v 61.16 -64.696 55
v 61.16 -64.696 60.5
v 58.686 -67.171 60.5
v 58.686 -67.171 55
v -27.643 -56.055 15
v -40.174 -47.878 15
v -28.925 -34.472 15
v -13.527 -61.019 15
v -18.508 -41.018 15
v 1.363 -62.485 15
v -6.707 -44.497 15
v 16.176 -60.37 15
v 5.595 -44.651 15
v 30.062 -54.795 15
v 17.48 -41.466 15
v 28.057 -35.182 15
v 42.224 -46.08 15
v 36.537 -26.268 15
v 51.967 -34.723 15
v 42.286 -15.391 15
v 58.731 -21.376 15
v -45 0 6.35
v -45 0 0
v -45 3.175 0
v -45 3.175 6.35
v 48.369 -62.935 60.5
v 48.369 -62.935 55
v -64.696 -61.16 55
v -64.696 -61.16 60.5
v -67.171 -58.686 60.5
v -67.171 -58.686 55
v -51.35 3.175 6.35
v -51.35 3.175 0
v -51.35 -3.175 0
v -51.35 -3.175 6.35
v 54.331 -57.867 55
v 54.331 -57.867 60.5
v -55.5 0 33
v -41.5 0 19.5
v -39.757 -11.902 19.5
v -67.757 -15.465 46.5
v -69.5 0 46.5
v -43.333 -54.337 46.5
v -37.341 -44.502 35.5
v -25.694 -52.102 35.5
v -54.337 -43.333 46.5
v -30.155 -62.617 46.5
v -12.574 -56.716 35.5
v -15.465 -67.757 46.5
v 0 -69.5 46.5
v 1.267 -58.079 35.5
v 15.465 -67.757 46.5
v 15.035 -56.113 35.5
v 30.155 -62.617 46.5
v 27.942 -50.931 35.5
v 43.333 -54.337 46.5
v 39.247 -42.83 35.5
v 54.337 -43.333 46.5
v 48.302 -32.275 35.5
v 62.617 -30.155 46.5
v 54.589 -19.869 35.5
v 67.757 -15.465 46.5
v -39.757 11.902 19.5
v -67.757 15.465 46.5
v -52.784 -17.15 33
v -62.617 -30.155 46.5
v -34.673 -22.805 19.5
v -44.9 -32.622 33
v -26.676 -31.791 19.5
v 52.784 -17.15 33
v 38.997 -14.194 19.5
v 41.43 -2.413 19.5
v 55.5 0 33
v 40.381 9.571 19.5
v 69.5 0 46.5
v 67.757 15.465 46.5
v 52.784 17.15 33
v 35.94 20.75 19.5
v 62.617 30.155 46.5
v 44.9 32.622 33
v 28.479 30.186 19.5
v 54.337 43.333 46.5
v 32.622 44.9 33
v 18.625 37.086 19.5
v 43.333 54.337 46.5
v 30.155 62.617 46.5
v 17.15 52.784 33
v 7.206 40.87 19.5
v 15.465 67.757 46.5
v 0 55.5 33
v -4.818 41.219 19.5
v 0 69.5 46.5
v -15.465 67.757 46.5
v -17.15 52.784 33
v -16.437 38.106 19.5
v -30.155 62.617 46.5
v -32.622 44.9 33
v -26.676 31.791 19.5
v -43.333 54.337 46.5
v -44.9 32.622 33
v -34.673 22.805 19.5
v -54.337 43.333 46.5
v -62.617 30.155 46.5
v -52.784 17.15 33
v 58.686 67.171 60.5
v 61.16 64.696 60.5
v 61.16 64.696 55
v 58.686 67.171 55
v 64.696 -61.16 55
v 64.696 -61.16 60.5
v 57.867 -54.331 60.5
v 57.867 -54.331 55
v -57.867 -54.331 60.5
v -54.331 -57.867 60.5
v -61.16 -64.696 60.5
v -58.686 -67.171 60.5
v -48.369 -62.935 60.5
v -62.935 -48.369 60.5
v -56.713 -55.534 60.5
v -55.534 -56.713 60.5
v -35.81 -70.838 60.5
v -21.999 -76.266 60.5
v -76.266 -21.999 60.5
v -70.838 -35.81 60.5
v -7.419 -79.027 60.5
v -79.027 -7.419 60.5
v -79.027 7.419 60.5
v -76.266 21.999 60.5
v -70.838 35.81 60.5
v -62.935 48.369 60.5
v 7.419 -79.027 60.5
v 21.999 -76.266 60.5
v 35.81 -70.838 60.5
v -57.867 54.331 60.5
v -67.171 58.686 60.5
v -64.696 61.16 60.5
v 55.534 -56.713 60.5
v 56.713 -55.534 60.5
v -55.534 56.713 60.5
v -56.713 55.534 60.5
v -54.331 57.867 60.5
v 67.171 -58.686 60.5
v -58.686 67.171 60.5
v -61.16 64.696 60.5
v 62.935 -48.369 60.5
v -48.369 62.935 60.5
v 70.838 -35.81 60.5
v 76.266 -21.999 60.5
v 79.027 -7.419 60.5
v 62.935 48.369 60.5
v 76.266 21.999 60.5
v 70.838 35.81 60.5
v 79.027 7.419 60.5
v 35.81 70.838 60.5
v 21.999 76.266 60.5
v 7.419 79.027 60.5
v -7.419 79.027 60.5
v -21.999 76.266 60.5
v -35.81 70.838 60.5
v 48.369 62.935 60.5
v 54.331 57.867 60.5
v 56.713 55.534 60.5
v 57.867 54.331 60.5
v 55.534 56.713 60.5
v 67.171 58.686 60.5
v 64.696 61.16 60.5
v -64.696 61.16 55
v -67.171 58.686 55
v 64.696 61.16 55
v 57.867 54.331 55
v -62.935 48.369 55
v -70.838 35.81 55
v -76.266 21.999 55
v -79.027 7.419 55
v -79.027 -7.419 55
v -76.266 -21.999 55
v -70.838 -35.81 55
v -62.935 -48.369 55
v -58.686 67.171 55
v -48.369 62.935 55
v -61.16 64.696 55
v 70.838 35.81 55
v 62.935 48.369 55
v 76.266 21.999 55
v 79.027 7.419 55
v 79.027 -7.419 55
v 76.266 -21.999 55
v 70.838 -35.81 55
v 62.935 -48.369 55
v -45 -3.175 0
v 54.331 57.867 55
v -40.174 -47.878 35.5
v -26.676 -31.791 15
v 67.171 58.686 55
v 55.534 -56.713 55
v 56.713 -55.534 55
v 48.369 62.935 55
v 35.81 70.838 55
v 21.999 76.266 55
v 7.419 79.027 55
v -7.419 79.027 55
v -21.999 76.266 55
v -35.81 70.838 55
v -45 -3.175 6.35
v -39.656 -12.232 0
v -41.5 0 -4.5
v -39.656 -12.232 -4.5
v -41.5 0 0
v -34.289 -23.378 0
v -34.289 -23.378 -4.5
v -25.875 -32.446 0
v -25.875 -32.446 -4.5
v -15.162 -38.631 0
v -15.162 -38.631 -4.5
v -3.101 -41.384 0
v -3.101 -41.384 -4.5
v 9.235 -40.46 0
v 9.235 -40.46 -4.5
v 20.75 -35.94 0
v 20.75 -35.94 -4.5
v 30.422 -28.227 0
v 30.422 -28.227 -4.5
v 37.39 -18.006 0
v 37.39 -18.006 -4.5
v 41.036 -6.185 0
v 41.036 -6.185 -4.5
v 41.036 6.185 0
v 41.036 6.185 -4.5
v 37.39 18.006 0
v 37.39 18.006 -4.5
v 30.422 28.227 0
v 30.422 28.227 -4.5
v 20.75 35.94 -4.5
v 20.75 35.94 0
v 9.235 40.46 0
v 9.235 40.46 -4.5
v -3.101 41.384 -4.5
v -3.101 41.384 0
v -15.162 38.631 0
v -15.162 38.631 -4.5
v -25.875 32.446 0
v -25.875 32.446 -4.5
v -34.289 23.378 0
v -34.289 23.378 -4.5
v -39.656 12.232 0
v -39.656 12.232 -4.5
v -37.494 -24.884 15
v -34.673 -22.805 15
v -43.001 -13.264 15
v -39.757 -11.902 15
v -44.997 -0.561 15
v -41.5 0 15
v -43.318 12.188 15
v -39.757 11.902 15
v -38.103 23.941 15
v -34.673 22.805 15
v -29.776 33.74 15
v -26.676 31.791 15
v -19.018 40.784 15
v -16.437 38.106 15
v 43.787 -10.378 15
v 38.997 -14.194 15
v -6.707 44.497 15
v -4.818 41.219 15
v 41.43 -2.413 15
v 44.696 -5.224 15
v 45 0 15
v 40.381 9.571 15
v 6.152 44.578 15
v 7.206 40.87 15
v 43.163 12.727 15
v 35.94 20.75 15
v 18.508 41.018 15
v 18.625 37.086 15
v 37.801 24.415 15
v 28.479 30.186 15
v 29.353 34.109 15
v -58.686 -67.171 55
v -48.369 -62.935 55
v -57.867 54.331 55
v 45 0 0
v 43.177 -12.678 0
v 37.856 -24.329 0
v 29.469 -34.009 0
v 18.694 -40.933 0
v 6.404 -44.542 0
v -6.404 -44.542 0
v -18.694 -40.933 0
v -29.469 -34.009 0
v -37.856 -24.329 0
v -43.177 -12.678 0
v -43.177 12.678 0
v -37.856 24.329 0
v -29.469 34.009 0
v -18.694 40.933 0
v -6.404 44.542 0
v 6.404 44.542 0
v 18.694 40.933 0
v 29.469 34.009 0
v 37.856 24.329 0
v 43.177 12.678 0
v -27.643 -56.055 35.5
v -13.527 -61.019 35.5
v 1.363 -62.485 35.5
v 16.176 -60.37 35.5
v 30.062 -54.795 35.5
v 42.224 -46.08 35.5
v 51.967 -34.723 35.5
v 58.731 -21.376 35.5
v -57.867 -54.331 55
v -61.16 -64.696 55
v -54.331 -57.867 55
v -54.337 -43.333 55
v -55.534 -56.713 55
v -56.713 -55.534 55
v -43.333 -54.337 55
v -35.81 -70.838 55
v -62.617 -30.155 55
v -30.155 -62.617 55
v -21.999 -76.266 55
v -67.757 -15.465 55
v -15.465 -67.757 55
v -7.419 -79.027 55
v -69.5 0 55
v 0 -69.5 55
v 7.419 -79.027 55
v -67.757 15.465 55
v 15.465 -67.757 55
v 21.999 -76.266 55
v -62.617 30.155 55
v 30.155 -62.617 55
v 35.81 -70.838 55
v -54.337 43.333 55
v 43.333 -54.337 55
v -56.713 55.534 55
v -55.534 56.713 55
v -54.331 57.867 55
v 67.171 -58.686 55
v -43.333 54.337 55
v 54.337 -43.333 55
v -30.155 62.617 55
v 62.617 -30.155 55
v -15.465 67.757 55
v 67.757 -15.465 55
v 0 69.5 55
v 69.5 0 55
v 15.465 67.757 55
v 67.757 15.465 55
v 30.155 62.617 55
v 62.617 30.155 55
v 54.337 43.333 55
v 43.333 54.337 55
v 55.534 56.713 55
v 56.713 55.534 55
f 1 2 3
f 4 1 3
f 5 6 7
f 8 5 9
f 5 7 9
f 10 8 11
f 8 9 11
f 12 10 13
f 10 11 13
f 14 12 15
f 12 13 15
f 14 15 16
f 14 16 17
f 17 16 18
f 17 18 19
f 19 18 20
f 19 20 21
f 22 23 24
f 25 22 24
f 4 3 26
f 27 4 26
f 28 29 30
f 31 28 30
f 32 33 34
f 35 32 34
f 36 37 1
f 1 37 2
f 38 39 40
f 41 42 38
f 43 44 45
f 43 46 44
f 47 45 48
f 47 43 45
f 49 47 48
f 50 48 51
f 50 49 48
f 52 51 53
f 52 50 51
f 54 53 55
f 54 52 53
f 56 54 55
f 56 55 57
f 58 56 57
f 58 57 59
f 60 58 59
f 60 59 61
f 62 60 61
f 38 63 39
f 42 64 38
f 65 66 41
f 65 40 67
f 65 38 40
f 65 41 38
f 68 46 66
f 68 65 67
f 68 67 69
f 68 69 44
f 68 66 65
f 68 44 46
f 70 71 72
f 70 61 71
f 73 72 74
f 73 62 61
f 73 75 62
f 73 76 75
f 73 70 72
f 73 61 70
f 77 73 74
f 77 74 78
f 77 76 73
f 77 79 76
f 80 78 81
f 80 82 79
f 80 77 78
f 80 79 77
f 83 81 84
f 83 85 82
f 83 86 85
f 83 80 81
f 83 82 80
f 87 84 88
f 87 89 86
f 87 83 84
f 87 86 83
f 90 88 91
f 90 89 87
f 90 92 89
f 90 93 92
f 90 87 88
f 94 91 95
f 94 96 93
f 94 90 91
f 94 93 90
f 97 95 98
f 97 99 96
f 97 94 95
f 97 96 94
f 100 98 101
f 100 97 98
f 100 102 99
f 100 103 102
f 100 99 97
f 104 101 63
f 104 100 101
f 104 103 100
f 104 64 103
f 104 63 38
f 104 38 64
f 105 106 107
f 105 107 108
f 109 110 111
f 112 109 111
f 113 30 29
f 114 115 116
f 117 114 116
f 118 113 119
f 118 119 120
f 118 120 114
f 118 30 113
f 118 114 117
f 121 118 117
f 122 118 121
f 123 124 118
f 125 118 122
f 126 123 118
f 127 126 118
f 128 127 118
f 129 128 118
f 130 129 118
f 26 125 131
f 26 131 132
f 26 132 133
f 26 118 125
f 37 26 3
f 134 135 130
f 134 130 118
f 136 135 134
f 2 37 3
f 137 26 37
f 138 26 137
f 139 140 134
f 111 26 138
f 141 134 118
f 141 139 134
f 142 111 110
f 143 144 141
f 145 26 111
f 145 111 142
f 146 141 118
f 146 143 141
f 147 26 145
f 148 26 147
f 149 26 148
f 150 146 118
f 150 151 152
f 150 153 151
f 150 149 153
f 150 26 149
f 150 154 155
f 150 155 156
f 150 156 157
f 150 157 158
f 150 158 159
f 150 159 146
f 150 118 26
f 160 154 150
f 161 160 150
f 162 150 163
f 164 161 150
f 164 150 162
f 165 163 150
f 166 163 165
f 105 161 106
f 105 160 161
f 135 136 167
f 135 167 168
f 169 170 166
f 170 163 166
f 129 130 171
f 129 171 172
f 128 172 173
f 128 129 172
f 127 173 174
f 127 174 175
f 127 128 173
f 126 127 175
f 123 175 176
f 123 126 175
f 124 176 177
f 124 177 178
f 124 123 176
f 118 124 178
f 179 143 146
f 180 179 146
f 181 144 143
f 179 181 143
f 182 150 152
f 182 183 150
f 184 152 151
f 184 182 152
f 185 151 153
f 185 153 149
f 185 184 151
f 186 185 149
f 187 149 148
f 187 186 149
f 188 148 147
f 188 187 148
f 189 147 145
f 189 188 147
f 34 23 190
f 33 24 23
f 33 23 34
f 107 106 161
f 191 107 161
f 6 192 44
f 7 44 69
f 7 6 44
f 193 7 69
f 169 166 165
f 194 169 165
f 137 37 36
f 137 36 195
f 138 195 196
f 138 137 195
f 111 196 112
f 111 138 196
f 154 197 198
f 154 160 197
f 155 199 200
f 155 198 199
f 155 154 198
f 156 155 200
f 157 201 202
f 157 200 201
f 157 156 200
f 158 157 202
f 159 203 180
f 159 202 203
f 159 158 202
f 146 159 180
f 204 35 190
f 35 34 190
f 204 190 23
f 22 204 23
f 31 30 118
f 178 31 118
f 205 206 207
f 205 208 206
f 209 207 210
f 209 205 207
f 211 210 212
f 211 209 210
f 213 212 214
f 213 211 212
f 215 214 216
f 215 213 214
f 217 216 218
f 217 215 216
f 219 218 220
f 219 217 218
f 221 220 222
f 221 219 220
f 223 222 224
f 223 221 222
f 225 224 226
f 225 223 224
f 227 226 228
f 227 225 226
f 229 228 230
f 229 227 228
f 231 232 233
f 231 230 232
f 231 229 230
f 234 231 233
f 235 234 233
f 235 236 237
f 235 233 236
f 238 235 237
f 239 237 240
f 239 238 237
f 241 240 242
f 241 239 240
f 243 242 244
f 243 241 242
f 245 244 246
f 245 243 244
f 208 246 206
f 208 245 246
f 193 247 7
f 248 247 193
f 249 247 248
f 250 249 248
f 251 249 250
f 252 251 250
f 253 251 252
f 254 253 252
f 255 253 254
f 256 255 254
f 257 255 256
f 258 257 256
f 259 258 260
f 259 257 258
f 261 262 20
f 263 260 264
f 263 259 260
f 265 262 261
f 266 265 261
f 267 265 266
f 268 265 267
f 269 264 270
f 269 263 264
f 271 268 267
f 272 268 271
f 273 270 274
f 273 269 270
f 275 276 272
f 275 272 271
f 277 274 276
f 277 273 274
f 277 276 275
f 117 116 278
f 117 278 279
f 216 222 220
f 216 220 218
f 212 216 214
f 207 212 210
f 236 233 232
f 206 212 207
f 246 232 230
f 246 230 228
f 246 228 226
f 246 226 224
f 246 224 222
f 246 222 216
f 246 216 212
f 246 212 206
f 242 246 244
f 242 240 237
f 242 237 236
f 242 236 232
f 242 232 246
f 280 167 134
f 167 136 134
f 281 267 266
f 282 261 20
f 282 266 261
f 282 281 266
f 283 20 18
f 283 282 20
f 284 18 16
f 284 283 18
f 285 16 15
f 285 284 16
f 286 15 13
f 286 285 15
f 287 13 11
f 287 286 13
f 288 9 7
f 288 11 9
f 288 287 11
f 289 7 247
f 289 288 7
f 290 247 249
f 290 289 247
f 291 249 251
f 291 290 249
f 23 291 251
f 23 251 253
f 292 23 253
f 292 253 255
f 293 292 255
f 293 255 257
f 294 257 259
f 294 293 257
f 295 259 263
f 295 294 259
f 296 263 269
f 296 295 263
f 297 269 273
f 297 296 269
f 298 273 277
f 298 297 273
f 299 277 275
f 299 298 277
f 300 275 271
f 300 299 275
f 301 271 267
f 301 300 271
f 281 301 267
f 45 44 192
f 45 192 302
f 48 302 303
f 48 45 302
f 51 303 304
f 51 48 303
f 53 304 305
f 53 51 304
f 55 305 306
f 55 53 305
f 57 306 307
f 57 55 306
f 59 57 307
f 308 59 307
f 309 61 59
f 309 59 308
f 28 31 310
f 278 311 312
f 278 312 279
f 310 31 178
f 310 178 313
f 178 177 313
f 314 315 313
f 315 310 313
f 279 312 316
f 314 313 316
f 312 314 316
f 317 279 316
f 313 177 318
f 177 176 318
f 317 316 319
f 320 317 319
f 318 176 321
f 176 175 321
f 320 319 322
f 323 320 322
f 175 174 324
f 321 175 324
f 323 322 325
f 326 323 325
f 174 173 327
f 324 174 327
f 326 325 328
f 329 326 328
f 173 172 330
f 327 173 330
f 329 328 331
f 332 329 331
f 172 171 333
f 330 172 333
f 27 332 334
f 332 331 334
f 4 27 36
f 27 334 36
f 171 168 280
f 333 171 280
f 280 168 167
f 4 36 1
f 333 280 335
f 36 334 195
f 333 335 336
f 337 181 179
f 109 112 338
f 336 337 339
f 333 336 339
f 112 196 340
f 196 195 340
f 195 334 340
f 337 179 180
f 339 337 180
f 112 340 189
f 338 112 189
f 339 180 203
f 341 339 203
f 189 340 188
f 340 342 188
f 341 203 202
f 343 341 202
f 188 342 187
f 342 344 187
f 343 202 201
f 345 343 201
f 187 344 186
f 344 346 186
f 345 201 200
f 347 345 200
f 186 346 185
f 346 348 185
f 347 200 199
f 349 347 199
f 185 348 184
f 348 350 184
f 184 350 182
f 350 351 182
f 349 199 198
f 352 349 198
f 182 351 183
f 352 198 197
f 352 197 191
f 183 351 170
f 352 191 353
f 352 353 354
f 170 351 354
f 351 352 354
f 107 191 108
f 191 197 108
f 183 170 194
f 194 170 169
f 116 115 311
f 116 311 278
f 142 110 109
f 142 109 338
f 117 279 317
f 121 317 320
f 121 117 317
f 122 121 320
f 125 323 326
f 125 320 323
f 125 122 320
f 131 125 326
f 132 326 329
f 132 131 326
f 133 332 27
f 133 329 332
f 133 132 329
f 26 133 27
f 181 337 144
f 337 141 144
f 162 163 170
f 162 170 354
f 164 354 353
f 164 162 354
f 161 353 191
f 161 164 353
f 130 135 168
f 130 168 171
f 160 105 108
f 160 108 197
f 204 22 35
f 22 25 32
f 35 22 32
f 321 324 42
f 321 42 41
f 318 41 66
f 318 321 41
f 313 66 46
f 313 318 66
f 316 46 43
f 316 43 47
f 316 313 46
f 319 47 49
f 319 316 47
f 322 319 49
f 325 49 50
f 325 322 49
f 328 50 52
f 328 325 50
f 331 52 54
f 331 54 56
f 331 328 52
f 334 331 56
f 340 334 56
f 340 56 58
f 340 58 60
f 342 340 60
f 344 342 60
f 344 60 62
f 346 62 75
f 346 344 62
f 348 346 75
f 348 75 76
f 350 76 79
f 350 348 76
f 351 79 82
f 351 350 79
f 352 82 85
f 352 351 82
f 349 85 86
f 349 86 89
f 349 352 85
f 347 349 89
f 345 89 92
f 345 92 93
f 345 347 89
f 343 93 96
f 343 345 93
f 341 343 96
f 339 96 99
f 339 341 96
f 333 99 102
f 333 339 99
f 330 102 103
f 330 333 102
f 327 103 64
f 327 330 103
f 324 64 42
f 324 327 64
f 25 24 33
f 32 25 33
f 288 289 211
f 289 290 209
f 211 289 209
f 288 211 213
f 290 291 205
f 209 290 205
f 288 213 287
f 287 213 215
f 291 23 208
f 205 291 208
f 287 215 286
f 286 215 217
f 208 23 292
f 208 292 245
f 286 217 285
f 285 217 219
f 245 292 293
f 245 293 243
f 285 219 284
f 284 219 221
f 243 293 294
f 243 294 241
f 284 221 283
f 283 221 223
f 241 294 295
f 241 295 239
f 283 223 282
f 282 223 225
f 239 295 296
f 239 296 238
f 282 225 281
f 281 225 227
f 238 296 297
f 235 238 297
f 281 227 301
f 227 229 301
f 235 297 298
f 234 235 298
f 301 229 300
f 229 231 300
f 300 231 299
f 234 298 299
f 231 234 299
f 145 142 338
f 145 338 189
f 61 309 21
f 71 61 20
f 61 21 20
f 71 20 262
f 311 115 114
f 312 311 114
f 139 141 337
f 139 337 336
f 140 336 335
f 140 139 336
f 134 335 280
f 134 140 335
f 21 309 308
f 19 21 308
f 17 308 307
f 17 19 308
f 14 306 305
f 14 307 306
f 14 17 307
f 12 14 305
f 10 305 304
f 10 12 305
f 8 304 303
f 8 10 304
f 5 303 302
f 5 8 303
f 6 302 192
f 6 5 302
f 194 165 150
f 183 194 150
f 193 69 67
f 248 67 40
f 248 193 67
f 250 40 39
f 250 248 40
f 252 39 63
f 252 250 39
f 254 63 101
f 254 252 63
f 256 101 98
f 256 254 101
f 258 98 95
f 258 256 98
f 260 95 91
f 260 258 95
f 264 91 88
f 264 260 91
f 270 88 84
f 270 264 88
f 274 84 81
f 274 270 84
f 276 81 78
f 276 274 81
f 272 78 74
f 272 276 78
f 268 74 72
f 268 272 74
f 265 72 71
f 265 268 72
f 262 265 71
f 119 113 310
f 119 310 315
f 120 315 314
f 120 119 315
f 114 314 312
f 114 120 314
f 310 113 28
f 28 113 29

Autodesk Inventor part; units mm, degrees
ref_plane "YZ Plane" through (0, 0, 0) normal (1, 0, 0) x (0, 1, 0)
ref_plane "XZ Plane" through (0, 0, 0) normal (0, 1, 0) x (-1, 0, 0)
sketch "Sketch1" plane through (0, 0, 0) normal (0, 0, 1) x (1, 0, 0)
  circle A0 centre (0, 0) radius 45
  dimension "d0" = 90
extrude "Extrusion1" add sketch "Sketch1" along normal blind 15
sketch "Sketch2" plane through (0, 0, 0) normal (0, 0, -1) x (-1, 0, 0)
  circle A0 centre (0, 0) radius 41.5
  dimension "d3" = 83
extrude "Extrusion2" add sketch "Sketch2" along normal blind 4.5
sketch "Sketch3" plane through (0, 0, 15) normal (0, 0, 1) x (1, 0, 0)
  circle A0 centre (0, 0) radius 41.5
  circle A1 centre (0, 0) radius 41.5 projected
extrude "Extrusion3" add sketch "Sketch3" along normal blind 4.5
ref_plane "Work Plane1" through (0, 0, 55) normal (0, 0, -1) x (-1, 0, 0)
sketch "Sketch4" plane through (0, 0, 55) normal (0, 0, -1) x (-1, 0, 0)
  circle A0 centre (0, 0) radius 69.5
  dimension "d9" = 139
extrude "Extrusion4" add sketch "Sketch4" along normal blind 8.5
loft "Loft1" add section 1 edges at (69.5, 0, 46.5) section 2 edges at (-41.5, 0, 19.5)
sketch "Sketch5" plane through (0, 0, 15) normal (0, 0, 1) x (1, 0, 0)
  circle A0 centre (0, 0) radius 69.5 projected
  circle A1 centre (0, 0) radius 41.5 projected
  circle A2 centre (0, 0) radius 41.5 projected
  arc A3 (-40.1742, -47.8778) -> (58.7308, -21.3763) centre (0, 0) ccw
  line L0 (58.7308, -21.3763) -> (38.9972, -14.1938)
  circle A4 centre (0, 0) radius 41.5 projected
  line L1 (-40.1742, -47.8778) -> (-26.6757, -31.7908)
  line L2 (0, 0) -> (24.5458, 0) construction
  dimension "d16" = 21
  dimension "d17" = 20
  dimension "d18" = 50
extrude "Extrusion5" add sketch "Sketch5" along normal blind 20.5 contours A1 L0 A3 L1
sketch "Sketch6" plane through (0, 0, 55) normal (0, 0, 1) x (1, 0, 0)
  circle A0 centre (0, 0) radius 79.375
  dimension "d21" = 158.75
extrude "Extrusion6" add sketch "Sketch6" along normal blind 5.5
sketch "Sketch7" plane through (0, 0, 60.5) normal (0, 0, 1) x (1, 0, 0)
  circle A0 centre (0, 0) radius 79.375 projected
  line L0 (-90.0773, 90.0773) -> (90.0773, -90.0773)
  line L1 (93.9163, 93.9163) -> (-93.9163, -93.9163)
  line L2 (0, 101.3033) -> (0, -101.3033)
  line L3 (-62.9282, 62.9282) -> (-55.15, 55.15) construction
  line L4 (-64.6959, 61.1604) -> (-56.9178, 53.3822)
  line L5 (-53.3822, 56.9178) -> (-61.1604, 64.6959)
  arc A1 (-61.1604, 64.6959) -> (-64.6959, 61.1604) centre (-62.9282, 62.9282) ccw
  arc A2 (-56.9178, 53.3822) -> (-53.3822, 56.9178) centre (-55.15, 55.15) ccw
  line L6 (62.9282, 62.9282) -> (55.15, 55.15) construction
  line L7 (61.1604, 64.6959) -> (53.3822, 56.9178)
  line L8 (56.9178, 53.3822) -> (64.6959, 61.1604)
  arc A3 (64.6959, 61.1604) -> (61.1604, 64.6959) centre (62.9282, 62.9282) ccw
  arc A4 (53.3822, 56.9178) -> (56.9178, 53.3822) centre (55.15, 55.15) ccw
  line L9 (-55.15, -55.15) -> (-62.9282, -62.9282) construction
  line L10 (-56.9178, -53.3822) -> (-64.6959, -61.1604)
  line L11 (-61.1604, -64.6959) -> (-53.3822, -56.9178)
  arc A5 (-53.3822, -56.9178) -> (-56.9178, -53.3822) centre (-55.15, -55.15) ccw
  arc A6 (-64.6959, -61.1604) -> (-61.1604, -64.6959) centre (-62.9282, -62.9282) ccw
  line L12 (55.15, -55.15) -> (62.9282, -62.9282) construction
  line L13 (53.3822, -56.9178) -> (61.1604, -64.6959)
  line L14 (64.6959, -61.1604) -> (56.9178, -53.3822)
  arc A7 (56.9178, -53.3822) -> (53.3822, -56.9178) centre (55.15, -55.15) ccw
  arc A8 (61.1604, -64.6959) -> (64.6959, -61.1604) centre (62.9282, -62.9282) ccw
  line L15 (-61.1604, 64.6959) -> (-58.6855, 67.1708)
  line L16 (-58.6855, 67.1708) -> (-48.3688, 62.9352)
  circle A9 centre (0, 0) radius 79.375 projected
  line L17 (-64.6959, 61.1604) -> (-67.1708, 58.6855)
  line L18 (-67.1708, 58.6855) -> (-62.9352, 48.3688)
  line L19 (64.6959, 61.1604) -> (67.1708, 58.6855)
  line L20 (67.1708, 58.6855) -> (62.9352, 48.3688)
  line L21 (61.1604, 64.6959) -> (58.6855, 67.1708)
  line L22 (58.6855, 67.1708) -> (48.3688, 62.9352)
  line L23 (64.6959, -61.1604) -> (67.1708, -58.6855)
  line L24 (67.1708, -58.6855) -> (62.9352, -48.3688)
  line L25 (61.1604, -64.6959) -> (58.6855, -67.1708)
  line L26 (58.6855, -67.1708) -> (48.3688, -62.9352)
  line L27 (-61.1604, -64.6959) -> (-58.6855, -67.1708)
  line L28 (-58.6855, -67.1708) -> (-48.3688, -62.9352)
  line L29 (-64.6959, -61.1604) -> (-67.1708, -58.6855)
  line L30 (-67.1708, -58.6855) -> (-62.9352, -48.3688)
  point P0 (-59.0391, 59.0391)
  point P1 (59.0391, 59.0391)
  point P2 (-59.0391, -59.0391)
  point P3 (59.0391, -59.0391)
  dimension "d24" = 45
  dimension "d25" = 45
  dimension "d26" = 5
  dimension "d27" = 5
  dimension "d28" = 11
  dimension "d29" = 11
  dimension "d30" = 110.3
  dimension "d31" = 5
  dimension "d32" = 5
  dimension "d33" = 11
  dimension "d34" = 11
  dimension "d35" = 110.3
  dimension "d36" = 3.5
  dimension "d37" = 7.8
  dimension "d38" = 3.5
  dimension "d39" = 7.8
  dimension "d40" = 3.5
  dimension "d41" = 3.5
  dimension "d42" = 7.8
  dimension "d43" = 7.8
  dimension "d44" = 3.5
  dimension "d45" = 3.5
  dimension "d46" = 7.8
  dimension "d47" = 7.8
  dimension "d48" = 3.5
  dimension "d49" = 3.5
  dimension "d50" = 7.8
  dimension "d51" = 7.8
extrude "Extrusion7" add sketch "Sketch7" against normal up to surface (5.5 mm away) contours A0 L14 A7 L0 L1 A4 L8 | A0 L8 L19 L20 | L24 L23 L14 A0 | L8 A4 L1 A0 | A0 L0 A7 L14 | L1 A4 L7 A0 | A0 L13 A7 L0 | L7 A4 L1 L2 A0 | A0 L22 L21 L7 | L13 L25 L26 A0 | A0 L2 L0 A7 L13 | L1 A5 L10 A0 L4 A2 L0 | L2 A0 L11 A5 L1 | L0 A2 L5 A0 L2 | A2 L4 A0 L0 | L0 A0 L5 A2 | A5 L11 A0 L1 | L1 A0 L10 A5 | A0 L5 L15 L16 | L28 L27 L11 A0 | A0 L18 L17 L4 | L10 L29 L30 A0
sketch "Sketch9" plane through (0, 0, 0) normal (0, 0, -1) x (-1, 0, 0)
  arc A0 (28.9254, -34.472) -> (-42.2862, -15.3909) centre (0, 0) ccw projected
  line L0 (45, 3.175) -> (51.35, 3.175)
  line L1 (51.35, 3.175) -> (51.35, -3.175)
  line L2 (51.35, -3.175) -> (45, -3.175)
  line L3 (45, -3.175) -> (45, 3.175)
  point P0 (45, 0)
  dimension "d54" = 6.35
  dimension "d55" = 6.35
extrude "Extrusion8" add sketch "Sketch9" against normal blind 6.35
equation "\"d29\" = d28"
equation "\"d33\" = d28"
equation "\"d34\" = d28"
equation "\"d35\" = d30"
equation "\"d38\" = d36"
equation "\"d39\" = d37"
equation "\"d40\" = d36"
equation "\"d41\" = d40"
equation "\"d42\" = d37"
equation "\"d43\" = d42"
equation "\"d44\" = d36"
equation "\"d45\" = d44"
equation "\"d46\" = d37"
equation "\"d47\" = d46"
equation "\"d48\" = d36"
equation "\"d49\" = d48"
equation "\"d50\" = d39"
equation "\"d51\" = d50"
equation "\"d55\" = d54"
properties part number "speaker"
